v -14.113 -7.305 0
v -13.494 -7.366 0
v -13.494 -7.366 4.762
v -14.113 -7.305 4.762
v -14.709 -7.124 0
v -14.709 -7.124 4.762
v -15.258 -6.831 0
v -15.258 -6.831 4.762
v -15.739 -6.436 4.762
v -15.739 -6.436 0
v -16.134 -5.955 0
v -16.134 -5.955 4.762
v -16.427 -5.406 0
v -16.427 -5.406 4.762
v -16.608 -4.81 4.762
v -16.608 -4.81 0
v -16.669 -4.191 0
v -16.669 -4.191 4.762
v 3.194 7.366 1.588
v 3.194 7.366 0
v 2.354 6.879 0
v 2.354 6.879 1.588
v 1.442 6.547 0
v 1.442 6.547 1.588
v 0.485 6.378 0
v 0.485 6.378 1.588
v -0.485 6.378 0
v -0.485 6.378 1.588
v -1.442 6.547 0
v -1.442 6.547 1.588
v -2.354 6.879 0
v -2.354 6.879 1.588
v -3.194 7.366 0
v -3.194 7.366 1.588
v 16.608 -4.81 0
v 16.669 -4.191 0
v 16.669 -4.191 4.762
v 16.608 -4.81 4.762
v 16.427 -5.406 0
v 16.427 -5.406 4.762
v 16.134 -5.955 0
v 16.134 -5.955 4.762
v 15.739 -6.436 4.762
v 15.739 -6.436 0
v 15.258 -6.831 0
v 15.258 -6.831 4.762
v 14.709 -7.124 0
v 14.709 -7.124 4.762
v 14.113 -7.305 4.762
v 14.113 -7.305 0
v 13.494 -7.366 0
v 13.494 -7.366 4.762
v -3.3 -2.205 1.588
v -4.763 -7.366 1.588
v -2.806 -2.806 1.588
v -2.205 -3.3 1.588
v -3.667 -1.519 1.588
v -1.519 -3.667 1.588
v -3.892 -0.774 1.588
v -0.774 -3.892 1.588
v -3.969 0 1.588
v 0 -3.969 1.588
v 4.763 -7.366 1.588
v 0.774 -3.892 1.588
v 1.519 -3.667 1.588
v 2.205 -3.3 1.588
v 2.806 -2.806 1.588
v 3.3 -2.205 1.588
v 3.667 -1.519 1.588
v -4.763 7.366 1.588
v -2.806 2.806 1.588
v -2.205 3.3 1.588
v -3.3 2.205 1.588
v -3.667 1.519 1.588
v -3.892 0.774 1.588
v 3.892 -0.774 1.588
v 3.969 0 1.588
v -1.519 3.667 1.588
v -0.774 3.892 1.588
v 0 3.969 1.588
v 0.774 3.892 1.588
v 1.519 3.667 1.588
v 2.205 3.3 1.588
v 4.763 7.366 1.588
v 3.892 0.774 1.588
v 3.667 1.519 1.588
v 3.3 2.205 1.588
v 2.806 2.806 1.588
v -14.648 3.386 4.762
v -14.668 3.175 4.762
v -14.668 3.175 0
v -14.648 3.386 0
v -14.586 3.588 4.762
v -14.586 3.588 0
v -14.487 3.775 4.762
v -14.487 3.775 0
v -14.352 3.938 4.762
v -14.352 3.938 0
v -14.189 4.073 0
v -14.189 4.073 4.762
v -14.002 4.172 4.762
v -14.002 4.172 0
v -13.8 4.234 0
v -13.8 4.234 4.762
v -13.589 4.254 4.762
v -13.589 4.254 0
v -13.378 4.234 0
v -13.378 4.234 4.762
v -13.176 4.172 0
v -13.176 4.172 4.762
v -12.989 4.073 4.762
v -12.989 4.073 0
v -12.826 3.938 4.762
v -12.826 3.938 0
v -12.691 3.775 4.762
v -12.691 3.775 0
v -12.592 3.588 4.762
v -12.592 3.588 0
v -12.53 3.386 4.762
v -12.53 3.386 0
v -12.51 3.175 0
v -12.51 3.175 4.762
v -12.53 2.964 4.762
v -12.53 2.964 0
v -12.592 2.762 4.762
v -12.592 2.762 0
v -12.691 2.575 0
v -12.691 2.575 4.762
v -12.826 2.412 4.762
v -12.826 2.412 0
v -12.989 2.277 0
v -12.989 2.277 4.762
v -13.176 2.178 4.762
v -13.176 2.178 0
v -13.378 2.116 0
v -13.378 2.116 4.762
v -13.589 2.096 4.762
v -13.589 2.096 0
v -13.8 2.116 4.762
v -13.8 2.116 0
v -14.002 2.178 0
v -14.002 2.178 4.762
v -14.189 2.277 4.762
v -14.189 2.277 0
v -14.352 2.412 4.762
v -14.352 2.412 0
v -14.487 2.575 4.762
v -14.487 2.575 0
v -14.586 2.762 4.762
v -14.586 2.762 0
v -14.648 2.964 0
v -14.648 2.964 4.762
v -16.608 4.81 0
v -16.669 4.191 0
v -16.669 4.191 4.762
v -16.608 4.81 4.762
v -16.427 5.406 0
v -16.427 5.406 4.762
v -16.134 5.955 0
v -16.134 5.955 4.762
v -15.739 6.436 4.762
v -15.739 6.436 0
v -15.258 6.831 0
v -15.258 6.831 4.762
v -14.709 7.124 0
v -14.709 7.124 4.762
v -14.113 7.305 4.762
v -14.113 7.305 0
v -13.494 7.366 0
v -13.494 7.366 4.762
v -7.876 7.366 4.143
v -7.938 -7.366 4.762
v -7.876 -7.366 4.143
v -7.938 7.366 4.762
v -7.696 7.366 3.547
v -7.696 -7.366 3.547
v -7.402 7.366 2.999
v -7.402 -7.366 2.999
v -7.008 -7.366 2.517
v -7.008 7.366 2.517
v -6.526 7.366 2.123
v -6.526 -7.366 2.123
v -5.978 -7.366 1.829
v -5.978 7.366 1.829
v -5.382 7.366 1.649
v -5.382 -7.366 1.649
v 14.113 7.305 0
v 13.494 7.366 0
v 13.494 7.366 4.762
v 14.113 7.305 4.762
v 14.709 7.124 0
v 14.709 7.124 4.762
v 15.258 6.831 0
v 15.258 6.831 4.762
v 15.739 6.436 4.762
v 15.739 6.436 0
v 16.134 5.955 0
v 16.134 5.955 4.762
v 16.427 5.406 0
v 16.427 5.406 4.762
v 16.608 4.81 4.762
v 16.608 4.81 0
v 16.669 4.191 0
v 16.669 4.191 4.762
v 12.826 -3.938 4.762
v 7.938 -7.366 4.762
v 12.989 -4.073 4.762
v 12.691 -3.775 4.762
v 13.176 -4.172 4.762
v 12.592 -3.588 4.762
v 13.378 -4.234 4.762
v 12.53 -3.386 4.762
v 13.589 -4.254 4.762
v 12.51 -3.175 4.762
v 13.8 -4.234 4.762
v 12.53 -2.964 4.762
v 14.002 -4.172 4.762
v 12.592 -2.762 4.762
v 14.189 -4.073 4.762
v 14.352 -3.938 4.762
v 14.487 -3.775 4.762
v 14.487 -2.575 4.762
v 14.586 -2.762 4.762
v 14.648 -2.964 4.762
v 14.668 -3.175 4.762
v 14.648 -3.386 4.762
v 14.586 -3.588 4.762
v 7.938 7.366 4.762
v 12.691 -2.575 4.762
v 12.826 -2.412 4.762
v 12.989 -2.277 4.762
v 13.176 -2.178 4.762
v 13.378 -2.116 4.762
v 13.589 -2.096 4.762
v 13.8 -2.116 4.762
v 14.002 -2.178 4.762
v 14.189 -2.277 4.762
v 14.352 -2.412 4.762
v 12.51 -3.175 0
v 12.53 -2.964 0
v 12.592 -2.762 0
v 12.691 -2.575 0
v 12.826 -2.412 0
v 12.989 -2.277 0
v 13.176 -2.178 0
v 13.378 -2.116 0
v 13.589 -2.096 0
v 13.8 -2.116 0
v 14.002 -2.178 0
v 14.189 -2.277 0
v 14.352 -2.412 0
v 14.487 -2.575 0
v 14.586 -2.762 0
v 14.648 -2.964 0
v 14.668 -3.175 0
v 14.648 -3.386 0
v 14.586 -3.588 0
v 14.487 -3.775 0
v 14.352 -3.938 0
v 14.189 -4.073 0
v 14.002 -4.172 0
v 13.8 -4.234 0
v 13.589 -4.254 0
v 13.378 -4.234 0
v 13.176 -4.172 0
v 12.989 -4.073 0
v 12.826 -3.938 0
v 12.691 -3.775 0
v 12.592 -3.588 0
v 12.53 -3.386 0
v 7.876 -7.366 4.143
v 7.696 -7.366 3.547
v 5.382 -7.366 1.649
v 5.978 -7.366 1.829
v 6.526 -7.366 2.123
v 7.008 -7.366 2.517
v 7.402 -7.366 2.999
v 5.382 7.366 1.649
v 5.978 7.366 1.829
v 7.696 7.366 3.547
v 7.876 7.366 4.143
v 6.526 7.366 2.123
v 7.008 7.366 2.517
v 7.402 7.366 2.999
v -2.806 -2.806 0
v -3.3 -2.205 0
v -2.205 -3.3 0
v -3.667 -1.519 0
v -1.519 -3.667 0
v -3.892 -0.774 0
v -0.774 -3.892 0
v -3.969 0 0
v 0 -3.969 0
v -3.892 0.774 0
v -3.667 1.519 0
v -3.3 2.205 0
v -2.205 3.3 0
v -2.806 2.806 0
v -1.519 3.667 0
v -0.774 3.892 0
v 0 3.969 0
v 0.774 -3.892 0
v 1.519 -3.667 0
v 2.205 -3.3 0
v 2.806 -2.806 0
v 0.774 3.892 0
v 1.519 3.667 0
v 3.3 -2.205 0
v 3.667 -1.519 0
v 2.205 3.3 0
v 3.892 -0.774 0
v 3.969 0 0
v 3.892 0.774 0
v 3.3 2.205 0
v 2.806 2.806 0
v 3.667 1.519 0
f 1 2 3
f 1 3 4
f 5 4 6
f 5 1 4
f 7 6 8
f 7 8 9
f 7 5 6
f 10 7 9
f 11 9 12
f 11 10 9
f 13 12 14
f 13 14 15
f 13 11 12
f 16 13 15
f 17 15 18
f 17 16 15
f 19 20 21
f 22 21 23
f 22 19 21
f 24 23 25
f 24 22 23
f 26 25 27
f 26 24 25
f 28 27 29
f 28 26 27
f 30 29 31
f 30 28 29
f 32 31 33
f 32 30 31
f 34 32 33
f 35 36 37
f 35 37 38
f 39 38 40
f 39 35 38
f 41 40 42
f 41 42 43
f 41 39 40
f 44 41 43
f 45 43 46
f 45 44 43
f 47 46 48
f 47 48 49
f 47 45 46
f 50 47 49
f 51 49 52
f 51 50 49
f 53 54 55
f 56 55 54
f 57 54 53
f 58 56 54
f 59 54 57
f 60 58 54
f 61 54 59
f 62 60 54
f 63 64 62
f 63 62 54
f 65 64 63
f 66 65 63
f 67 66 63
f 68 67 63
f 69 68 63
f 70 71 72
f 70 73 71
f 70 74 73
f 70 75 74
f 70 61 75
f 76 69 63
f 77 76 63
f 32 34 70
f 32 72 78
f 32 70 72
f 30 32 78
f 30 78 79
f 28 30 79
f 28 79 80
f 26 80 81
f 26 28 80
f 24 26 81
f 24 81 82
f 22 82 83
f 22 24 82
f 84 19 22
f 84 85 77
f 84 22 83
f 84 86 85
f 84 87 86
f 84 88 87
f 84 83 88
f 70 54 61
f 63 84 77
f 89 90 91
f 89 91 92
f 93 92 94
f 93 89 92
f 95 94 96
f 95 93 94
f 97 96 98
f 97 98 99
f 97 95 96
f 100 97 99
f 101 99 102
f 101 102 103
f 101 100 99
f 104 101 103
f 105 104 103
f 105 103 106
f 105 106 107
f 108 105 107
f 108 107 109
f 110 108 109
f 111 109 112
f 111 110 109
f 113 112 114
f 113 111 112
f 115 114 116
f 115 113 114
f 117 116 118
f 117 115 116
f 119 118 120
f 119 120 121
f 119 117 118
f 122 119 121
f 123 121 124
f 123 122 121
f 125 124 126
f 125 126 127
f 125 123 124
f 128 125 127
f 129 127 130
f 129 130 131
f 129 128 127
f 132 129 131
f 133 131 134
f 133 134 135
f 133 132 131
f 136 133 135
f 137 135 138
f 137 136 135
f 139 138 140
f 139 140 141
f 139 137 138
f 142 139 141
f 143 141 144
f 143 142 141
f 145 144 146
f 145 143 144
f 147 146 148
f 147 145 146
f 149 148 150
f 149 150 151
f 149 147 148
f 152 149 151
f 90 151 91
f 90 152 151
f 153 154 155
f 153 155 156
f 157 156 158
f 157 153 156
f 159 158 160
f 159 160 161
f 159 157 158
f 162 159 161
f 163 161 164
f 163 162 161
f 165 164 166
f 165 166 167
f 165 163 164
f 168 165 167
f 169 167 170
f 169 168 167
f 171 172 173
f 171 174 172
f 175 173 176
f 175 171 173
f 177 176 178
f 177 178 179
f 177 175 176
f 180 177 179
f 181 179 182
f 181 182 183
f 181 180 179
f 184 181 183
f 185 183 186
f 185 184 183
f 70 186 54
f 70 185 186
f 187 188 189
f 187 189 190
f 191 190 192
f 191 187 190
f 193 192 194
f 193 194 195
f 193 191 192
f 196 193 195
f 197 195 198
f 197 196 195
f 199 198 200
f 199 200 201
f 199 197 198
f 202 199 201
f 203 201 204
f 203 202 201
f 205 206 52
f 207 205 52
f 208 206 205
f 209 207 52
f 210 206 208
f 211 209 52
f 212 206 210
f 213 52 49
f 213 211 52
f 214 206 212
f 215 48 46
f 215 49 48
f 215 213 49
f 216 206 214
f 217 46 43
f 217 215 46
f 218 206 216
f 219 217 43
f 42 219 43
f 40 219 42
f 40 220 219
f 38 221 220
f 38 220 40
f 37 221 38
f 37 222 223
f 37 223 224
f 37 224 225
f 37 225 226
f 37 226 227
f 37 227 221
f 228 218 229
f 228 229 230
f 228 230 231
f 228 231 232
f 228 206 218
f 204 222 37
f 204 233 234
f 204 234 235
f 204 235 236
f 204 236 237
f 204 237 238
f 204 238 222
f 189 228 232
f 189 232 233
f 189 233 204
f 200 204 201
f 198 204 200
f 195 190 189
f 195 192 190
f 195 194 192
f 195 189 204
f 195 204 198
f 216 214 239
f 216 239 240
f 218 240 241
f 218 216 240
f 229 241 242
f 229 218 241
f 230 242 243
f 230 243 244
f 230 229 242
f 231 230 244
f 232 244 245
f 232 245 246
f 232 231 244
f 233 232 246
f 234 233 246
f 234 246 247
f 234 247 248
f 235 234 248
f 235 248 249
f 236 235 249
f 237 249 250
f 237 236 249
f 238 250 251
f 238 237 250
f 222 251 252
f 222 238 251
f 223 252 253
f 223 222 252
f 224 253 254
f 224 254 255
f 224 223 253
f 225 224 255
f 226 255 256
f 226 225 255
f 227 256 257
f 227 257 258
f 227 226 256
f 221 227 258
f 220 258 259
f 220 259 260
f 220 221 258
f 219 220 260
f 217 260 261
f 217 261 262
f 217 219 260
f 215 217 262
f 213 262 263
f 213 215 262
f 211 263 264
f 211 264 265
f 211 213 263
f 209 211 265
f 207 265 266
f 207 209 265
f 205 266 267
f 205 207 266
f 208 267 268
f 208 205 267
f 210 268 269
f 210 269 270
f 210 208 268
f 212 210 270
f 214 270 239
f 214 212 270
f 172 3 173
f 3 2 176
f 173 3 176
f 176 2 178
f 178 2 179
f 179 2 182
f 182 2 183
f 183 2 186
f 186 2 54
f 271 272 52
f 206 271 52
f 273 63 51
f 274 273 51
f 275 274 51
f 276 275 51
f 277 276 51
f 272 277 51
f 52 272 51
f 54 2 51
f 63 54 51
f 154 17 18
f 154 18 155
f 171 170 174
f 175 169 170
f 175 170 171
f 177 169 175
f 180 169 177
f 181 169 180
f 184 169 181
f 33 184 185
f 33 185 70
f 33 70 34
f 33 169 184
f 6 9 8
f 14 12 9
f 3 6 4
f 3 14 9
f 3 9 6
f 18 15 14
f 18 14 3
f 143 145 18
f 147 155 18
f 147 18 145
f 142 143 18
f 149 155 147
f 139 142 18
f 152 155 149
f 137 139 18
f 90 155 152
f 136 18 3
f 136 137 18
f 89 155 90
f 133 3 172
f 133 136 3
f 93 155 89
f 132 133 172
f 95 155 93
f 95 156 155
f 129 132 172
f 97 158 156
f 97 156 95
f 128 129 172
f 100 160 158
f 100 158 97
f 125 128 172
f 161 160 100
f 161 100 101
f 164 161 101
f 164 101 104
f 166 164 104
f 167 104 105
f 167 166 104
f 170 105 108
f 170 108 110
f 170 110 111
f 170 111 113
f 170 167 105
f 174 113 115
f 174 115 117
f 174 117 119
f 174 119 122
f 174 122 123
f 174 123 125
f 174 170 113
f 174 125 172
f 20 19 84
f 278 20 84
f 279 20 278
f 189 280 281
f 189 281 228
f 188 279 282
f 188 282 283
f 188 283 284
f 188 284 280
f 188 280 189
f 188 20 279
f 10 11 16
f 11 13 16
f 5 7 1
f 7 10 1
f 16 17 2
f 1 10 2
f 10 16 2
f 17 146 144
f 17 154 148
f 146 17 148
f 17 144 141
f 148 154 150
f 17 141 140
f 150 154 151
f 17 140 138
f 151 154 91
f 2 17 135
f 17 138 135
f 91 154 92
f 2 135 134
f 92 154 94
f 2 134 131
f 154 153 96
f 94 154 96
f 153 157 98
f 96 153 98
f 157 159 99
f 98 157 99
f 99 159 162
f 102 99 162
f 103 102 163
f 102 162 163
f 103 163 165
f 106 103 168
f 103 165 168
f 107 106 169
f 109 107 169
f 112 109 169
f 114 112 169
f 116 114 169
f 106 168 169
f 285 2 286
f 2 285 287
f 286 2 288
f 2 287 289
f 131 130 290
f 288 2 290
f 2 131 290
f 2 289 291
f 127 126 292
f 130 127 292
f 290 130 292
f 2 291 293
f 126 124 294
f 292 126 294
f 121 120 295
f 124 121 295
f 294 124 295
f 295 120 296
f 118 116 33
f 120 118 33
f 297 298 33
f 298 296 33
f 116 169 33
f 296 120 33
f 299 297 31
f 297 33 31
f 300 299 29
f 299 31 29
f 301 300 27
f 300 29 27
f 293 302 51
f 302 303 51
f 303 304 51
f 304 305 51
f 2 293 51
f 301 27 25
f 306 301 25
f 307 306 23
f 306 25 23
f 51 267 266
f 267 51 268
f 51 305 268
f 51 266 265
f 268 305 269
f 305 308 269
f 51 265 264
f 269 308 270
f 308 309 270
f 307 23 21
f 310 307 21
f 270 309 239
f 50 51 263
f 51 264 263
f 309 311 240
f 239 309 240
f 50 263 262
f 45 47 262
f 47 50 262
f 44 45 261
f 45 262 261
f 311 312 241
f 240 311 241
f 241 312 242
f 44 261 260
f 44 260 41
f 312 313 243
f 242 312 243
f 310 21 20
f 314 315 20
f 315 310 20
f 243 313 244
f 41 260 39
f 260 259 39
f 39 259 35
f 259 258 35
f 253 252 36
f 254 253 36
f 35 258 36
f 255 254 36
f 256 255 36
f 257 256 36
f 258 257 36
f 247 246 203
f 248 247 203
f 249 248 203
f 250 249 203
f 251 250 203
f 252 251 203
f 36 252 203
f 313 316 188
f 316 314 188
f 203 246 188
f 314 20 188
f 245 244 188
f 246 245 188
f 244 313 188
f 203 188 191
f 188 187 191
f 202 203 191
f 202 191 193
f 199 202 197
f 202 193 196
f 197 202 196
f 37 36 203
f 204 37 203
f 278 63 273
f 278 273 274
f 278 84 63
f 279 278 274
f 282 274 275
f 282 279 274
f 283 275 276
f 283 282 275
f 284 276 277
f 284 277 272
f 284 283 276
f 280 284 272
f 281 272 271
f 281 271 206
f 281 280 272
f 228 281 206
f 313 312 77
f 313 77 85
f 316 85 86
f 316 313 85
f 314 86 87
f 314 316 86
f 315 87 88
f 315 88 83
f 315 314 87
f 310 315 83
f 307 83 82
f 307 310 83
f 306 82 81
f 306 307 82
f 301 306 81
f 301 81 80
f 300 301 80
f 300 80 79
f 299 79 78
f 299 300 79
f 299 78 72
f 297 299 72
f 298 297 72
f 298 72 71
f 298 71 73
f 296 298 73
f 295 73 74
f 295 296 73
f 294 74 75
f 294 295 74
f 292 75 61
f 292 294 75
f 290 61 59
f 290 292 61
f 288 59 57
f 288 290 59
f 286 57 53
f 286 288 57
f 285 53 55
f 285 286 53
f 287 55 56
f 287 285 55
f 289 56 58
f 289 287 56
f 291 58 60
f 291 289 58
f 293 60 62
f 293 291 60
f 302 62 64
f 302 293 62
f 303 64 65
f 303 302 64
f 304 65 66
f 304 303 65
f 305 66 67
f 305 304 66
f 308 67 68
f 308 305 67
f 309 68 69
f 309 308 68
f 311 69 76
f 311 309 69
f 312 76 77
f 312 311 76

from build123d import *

# Parameters (mm, degrees)
SKETCH1_W          = 33.3375
SKETCH1_H          = 14.732
SKETCH1_R          = 3.96875
EXTRUDE1_DEPTH     = 1.5875
SKETCH3_W          = 8.73125
SKETCH3_H          = 14.732
EXTRUDE2_DEPTH     = 3.175
CUT_EXTRUDE1_START = -4.7625
SKETCH2_R          = 1.0795
SKETCH2_R_2        = 5.55625
CUT_EXTRUDE1_DEPTH = 4.7625
FILLET2_R          = 3.175
SPLIT1_DEPTH       = 4.7625


# Read off the part's stored shape, not the designer's step: Split1
with BuildPart() as part:
    # Sketch1 → Extrude1 (new body)
    with BuildSketch(Plane.XY):
        Rectangle(SKETCH1_W, SKETCH1_H)
        Circle(SKETCH1_R, mode=Mode.SUBTRACT)
    extrude(amount=EXTRUDE1_DEPTH)

    # Sketch3 → Extrude2 (add)
    with BuildSketch(Plane.XY.offset(1.5875)):
        with Locations((-12.303125, 0)):
            Rectangle(SKETCH3_W, SKETCH3_H)
        with Locations((12.303125, 0)):
            Rectangle(SKETCH3_W, SKETCH3_H)
    extrude(amount=EXTRUDE2_DEPTH)

    # Sketch2 → Cut-Extrude1 (cut)
    with BuildSketch(Plane(origin=(0, 0, 0), x_dir=(-1, 0, 0), z_dir=(0, 0, -1)).offset(CUT_EXTRUDE1_START)):
        with Locations((-13.589, -3.175)):
            Circle(SKETCH2_R)
        with Locations((13.589, 3.175)):
            Circle(SKETCH2_R)
        with Locations((0, 11.9126)):
            Circle(SKETCH2_R_2)
    extrude(amount=CUT_EXTRUDE1_DEPTH, mode=Mode.SUBTRACT)

    # Fillet2
    fillet2_edges = [part.edges().sort_by_distance(p)[0] for p in [
        (-7.9375, 0, 1.5875),
        (7.9375, 0, 1.5875),
    ]]
    fillet(fillet2_edges, radius=FILLET2_R - 0.0001)  # a hair under: the kernel refuses the full size

    # Split1 outline → Split1 (cut)
    with BuildSketch(Plane.XY):
        with BuildLine():
            Line((-16.66875, -7.366), (-13.49375, -7.366))
            ThreePointArc((-13.49375, -7.366), (-15.73881403, -6.43606403), (-16.66875, -4.191))
            Line((-16.66875, -4.191), (-16.66875, -7.366))
        make_face()
        with BuildLine():
            ThreePointArc((13.49375, 7.366), (15.73881403, 6.43606403), (16.66875, 4.191))
            Line((16.66875, 4.191), (16.66875, 7.366))
            Line((16.66875, 7.366), (13.49375, 7.366))
        make_face()
        with BuildLine():
            ThreePointArc((16.66875, -4.191), (15.73881403, -6.43606403), (13.49375, -7.366))
            Line((13.49375, -7.366), (16.66875, -7.366))
            Line((16.66875, -7.366), (16.66875, -4.191))
        make_face()
        with BuildLine():
            Line((-16.66875, 7.366), (-16.66875, 4.191))
            ThreePointArc((-16.66875, 4.191), (-15.73881403, 6.43606403), (-13.49375, 7.366))
            Line((-13.49375, 7.366), (-16.66875, 7.366))
        make_face()
    extrude(amount=SPLIT1_DEPTH, mode=Mode.SUBTRACT)


solid = part.part
